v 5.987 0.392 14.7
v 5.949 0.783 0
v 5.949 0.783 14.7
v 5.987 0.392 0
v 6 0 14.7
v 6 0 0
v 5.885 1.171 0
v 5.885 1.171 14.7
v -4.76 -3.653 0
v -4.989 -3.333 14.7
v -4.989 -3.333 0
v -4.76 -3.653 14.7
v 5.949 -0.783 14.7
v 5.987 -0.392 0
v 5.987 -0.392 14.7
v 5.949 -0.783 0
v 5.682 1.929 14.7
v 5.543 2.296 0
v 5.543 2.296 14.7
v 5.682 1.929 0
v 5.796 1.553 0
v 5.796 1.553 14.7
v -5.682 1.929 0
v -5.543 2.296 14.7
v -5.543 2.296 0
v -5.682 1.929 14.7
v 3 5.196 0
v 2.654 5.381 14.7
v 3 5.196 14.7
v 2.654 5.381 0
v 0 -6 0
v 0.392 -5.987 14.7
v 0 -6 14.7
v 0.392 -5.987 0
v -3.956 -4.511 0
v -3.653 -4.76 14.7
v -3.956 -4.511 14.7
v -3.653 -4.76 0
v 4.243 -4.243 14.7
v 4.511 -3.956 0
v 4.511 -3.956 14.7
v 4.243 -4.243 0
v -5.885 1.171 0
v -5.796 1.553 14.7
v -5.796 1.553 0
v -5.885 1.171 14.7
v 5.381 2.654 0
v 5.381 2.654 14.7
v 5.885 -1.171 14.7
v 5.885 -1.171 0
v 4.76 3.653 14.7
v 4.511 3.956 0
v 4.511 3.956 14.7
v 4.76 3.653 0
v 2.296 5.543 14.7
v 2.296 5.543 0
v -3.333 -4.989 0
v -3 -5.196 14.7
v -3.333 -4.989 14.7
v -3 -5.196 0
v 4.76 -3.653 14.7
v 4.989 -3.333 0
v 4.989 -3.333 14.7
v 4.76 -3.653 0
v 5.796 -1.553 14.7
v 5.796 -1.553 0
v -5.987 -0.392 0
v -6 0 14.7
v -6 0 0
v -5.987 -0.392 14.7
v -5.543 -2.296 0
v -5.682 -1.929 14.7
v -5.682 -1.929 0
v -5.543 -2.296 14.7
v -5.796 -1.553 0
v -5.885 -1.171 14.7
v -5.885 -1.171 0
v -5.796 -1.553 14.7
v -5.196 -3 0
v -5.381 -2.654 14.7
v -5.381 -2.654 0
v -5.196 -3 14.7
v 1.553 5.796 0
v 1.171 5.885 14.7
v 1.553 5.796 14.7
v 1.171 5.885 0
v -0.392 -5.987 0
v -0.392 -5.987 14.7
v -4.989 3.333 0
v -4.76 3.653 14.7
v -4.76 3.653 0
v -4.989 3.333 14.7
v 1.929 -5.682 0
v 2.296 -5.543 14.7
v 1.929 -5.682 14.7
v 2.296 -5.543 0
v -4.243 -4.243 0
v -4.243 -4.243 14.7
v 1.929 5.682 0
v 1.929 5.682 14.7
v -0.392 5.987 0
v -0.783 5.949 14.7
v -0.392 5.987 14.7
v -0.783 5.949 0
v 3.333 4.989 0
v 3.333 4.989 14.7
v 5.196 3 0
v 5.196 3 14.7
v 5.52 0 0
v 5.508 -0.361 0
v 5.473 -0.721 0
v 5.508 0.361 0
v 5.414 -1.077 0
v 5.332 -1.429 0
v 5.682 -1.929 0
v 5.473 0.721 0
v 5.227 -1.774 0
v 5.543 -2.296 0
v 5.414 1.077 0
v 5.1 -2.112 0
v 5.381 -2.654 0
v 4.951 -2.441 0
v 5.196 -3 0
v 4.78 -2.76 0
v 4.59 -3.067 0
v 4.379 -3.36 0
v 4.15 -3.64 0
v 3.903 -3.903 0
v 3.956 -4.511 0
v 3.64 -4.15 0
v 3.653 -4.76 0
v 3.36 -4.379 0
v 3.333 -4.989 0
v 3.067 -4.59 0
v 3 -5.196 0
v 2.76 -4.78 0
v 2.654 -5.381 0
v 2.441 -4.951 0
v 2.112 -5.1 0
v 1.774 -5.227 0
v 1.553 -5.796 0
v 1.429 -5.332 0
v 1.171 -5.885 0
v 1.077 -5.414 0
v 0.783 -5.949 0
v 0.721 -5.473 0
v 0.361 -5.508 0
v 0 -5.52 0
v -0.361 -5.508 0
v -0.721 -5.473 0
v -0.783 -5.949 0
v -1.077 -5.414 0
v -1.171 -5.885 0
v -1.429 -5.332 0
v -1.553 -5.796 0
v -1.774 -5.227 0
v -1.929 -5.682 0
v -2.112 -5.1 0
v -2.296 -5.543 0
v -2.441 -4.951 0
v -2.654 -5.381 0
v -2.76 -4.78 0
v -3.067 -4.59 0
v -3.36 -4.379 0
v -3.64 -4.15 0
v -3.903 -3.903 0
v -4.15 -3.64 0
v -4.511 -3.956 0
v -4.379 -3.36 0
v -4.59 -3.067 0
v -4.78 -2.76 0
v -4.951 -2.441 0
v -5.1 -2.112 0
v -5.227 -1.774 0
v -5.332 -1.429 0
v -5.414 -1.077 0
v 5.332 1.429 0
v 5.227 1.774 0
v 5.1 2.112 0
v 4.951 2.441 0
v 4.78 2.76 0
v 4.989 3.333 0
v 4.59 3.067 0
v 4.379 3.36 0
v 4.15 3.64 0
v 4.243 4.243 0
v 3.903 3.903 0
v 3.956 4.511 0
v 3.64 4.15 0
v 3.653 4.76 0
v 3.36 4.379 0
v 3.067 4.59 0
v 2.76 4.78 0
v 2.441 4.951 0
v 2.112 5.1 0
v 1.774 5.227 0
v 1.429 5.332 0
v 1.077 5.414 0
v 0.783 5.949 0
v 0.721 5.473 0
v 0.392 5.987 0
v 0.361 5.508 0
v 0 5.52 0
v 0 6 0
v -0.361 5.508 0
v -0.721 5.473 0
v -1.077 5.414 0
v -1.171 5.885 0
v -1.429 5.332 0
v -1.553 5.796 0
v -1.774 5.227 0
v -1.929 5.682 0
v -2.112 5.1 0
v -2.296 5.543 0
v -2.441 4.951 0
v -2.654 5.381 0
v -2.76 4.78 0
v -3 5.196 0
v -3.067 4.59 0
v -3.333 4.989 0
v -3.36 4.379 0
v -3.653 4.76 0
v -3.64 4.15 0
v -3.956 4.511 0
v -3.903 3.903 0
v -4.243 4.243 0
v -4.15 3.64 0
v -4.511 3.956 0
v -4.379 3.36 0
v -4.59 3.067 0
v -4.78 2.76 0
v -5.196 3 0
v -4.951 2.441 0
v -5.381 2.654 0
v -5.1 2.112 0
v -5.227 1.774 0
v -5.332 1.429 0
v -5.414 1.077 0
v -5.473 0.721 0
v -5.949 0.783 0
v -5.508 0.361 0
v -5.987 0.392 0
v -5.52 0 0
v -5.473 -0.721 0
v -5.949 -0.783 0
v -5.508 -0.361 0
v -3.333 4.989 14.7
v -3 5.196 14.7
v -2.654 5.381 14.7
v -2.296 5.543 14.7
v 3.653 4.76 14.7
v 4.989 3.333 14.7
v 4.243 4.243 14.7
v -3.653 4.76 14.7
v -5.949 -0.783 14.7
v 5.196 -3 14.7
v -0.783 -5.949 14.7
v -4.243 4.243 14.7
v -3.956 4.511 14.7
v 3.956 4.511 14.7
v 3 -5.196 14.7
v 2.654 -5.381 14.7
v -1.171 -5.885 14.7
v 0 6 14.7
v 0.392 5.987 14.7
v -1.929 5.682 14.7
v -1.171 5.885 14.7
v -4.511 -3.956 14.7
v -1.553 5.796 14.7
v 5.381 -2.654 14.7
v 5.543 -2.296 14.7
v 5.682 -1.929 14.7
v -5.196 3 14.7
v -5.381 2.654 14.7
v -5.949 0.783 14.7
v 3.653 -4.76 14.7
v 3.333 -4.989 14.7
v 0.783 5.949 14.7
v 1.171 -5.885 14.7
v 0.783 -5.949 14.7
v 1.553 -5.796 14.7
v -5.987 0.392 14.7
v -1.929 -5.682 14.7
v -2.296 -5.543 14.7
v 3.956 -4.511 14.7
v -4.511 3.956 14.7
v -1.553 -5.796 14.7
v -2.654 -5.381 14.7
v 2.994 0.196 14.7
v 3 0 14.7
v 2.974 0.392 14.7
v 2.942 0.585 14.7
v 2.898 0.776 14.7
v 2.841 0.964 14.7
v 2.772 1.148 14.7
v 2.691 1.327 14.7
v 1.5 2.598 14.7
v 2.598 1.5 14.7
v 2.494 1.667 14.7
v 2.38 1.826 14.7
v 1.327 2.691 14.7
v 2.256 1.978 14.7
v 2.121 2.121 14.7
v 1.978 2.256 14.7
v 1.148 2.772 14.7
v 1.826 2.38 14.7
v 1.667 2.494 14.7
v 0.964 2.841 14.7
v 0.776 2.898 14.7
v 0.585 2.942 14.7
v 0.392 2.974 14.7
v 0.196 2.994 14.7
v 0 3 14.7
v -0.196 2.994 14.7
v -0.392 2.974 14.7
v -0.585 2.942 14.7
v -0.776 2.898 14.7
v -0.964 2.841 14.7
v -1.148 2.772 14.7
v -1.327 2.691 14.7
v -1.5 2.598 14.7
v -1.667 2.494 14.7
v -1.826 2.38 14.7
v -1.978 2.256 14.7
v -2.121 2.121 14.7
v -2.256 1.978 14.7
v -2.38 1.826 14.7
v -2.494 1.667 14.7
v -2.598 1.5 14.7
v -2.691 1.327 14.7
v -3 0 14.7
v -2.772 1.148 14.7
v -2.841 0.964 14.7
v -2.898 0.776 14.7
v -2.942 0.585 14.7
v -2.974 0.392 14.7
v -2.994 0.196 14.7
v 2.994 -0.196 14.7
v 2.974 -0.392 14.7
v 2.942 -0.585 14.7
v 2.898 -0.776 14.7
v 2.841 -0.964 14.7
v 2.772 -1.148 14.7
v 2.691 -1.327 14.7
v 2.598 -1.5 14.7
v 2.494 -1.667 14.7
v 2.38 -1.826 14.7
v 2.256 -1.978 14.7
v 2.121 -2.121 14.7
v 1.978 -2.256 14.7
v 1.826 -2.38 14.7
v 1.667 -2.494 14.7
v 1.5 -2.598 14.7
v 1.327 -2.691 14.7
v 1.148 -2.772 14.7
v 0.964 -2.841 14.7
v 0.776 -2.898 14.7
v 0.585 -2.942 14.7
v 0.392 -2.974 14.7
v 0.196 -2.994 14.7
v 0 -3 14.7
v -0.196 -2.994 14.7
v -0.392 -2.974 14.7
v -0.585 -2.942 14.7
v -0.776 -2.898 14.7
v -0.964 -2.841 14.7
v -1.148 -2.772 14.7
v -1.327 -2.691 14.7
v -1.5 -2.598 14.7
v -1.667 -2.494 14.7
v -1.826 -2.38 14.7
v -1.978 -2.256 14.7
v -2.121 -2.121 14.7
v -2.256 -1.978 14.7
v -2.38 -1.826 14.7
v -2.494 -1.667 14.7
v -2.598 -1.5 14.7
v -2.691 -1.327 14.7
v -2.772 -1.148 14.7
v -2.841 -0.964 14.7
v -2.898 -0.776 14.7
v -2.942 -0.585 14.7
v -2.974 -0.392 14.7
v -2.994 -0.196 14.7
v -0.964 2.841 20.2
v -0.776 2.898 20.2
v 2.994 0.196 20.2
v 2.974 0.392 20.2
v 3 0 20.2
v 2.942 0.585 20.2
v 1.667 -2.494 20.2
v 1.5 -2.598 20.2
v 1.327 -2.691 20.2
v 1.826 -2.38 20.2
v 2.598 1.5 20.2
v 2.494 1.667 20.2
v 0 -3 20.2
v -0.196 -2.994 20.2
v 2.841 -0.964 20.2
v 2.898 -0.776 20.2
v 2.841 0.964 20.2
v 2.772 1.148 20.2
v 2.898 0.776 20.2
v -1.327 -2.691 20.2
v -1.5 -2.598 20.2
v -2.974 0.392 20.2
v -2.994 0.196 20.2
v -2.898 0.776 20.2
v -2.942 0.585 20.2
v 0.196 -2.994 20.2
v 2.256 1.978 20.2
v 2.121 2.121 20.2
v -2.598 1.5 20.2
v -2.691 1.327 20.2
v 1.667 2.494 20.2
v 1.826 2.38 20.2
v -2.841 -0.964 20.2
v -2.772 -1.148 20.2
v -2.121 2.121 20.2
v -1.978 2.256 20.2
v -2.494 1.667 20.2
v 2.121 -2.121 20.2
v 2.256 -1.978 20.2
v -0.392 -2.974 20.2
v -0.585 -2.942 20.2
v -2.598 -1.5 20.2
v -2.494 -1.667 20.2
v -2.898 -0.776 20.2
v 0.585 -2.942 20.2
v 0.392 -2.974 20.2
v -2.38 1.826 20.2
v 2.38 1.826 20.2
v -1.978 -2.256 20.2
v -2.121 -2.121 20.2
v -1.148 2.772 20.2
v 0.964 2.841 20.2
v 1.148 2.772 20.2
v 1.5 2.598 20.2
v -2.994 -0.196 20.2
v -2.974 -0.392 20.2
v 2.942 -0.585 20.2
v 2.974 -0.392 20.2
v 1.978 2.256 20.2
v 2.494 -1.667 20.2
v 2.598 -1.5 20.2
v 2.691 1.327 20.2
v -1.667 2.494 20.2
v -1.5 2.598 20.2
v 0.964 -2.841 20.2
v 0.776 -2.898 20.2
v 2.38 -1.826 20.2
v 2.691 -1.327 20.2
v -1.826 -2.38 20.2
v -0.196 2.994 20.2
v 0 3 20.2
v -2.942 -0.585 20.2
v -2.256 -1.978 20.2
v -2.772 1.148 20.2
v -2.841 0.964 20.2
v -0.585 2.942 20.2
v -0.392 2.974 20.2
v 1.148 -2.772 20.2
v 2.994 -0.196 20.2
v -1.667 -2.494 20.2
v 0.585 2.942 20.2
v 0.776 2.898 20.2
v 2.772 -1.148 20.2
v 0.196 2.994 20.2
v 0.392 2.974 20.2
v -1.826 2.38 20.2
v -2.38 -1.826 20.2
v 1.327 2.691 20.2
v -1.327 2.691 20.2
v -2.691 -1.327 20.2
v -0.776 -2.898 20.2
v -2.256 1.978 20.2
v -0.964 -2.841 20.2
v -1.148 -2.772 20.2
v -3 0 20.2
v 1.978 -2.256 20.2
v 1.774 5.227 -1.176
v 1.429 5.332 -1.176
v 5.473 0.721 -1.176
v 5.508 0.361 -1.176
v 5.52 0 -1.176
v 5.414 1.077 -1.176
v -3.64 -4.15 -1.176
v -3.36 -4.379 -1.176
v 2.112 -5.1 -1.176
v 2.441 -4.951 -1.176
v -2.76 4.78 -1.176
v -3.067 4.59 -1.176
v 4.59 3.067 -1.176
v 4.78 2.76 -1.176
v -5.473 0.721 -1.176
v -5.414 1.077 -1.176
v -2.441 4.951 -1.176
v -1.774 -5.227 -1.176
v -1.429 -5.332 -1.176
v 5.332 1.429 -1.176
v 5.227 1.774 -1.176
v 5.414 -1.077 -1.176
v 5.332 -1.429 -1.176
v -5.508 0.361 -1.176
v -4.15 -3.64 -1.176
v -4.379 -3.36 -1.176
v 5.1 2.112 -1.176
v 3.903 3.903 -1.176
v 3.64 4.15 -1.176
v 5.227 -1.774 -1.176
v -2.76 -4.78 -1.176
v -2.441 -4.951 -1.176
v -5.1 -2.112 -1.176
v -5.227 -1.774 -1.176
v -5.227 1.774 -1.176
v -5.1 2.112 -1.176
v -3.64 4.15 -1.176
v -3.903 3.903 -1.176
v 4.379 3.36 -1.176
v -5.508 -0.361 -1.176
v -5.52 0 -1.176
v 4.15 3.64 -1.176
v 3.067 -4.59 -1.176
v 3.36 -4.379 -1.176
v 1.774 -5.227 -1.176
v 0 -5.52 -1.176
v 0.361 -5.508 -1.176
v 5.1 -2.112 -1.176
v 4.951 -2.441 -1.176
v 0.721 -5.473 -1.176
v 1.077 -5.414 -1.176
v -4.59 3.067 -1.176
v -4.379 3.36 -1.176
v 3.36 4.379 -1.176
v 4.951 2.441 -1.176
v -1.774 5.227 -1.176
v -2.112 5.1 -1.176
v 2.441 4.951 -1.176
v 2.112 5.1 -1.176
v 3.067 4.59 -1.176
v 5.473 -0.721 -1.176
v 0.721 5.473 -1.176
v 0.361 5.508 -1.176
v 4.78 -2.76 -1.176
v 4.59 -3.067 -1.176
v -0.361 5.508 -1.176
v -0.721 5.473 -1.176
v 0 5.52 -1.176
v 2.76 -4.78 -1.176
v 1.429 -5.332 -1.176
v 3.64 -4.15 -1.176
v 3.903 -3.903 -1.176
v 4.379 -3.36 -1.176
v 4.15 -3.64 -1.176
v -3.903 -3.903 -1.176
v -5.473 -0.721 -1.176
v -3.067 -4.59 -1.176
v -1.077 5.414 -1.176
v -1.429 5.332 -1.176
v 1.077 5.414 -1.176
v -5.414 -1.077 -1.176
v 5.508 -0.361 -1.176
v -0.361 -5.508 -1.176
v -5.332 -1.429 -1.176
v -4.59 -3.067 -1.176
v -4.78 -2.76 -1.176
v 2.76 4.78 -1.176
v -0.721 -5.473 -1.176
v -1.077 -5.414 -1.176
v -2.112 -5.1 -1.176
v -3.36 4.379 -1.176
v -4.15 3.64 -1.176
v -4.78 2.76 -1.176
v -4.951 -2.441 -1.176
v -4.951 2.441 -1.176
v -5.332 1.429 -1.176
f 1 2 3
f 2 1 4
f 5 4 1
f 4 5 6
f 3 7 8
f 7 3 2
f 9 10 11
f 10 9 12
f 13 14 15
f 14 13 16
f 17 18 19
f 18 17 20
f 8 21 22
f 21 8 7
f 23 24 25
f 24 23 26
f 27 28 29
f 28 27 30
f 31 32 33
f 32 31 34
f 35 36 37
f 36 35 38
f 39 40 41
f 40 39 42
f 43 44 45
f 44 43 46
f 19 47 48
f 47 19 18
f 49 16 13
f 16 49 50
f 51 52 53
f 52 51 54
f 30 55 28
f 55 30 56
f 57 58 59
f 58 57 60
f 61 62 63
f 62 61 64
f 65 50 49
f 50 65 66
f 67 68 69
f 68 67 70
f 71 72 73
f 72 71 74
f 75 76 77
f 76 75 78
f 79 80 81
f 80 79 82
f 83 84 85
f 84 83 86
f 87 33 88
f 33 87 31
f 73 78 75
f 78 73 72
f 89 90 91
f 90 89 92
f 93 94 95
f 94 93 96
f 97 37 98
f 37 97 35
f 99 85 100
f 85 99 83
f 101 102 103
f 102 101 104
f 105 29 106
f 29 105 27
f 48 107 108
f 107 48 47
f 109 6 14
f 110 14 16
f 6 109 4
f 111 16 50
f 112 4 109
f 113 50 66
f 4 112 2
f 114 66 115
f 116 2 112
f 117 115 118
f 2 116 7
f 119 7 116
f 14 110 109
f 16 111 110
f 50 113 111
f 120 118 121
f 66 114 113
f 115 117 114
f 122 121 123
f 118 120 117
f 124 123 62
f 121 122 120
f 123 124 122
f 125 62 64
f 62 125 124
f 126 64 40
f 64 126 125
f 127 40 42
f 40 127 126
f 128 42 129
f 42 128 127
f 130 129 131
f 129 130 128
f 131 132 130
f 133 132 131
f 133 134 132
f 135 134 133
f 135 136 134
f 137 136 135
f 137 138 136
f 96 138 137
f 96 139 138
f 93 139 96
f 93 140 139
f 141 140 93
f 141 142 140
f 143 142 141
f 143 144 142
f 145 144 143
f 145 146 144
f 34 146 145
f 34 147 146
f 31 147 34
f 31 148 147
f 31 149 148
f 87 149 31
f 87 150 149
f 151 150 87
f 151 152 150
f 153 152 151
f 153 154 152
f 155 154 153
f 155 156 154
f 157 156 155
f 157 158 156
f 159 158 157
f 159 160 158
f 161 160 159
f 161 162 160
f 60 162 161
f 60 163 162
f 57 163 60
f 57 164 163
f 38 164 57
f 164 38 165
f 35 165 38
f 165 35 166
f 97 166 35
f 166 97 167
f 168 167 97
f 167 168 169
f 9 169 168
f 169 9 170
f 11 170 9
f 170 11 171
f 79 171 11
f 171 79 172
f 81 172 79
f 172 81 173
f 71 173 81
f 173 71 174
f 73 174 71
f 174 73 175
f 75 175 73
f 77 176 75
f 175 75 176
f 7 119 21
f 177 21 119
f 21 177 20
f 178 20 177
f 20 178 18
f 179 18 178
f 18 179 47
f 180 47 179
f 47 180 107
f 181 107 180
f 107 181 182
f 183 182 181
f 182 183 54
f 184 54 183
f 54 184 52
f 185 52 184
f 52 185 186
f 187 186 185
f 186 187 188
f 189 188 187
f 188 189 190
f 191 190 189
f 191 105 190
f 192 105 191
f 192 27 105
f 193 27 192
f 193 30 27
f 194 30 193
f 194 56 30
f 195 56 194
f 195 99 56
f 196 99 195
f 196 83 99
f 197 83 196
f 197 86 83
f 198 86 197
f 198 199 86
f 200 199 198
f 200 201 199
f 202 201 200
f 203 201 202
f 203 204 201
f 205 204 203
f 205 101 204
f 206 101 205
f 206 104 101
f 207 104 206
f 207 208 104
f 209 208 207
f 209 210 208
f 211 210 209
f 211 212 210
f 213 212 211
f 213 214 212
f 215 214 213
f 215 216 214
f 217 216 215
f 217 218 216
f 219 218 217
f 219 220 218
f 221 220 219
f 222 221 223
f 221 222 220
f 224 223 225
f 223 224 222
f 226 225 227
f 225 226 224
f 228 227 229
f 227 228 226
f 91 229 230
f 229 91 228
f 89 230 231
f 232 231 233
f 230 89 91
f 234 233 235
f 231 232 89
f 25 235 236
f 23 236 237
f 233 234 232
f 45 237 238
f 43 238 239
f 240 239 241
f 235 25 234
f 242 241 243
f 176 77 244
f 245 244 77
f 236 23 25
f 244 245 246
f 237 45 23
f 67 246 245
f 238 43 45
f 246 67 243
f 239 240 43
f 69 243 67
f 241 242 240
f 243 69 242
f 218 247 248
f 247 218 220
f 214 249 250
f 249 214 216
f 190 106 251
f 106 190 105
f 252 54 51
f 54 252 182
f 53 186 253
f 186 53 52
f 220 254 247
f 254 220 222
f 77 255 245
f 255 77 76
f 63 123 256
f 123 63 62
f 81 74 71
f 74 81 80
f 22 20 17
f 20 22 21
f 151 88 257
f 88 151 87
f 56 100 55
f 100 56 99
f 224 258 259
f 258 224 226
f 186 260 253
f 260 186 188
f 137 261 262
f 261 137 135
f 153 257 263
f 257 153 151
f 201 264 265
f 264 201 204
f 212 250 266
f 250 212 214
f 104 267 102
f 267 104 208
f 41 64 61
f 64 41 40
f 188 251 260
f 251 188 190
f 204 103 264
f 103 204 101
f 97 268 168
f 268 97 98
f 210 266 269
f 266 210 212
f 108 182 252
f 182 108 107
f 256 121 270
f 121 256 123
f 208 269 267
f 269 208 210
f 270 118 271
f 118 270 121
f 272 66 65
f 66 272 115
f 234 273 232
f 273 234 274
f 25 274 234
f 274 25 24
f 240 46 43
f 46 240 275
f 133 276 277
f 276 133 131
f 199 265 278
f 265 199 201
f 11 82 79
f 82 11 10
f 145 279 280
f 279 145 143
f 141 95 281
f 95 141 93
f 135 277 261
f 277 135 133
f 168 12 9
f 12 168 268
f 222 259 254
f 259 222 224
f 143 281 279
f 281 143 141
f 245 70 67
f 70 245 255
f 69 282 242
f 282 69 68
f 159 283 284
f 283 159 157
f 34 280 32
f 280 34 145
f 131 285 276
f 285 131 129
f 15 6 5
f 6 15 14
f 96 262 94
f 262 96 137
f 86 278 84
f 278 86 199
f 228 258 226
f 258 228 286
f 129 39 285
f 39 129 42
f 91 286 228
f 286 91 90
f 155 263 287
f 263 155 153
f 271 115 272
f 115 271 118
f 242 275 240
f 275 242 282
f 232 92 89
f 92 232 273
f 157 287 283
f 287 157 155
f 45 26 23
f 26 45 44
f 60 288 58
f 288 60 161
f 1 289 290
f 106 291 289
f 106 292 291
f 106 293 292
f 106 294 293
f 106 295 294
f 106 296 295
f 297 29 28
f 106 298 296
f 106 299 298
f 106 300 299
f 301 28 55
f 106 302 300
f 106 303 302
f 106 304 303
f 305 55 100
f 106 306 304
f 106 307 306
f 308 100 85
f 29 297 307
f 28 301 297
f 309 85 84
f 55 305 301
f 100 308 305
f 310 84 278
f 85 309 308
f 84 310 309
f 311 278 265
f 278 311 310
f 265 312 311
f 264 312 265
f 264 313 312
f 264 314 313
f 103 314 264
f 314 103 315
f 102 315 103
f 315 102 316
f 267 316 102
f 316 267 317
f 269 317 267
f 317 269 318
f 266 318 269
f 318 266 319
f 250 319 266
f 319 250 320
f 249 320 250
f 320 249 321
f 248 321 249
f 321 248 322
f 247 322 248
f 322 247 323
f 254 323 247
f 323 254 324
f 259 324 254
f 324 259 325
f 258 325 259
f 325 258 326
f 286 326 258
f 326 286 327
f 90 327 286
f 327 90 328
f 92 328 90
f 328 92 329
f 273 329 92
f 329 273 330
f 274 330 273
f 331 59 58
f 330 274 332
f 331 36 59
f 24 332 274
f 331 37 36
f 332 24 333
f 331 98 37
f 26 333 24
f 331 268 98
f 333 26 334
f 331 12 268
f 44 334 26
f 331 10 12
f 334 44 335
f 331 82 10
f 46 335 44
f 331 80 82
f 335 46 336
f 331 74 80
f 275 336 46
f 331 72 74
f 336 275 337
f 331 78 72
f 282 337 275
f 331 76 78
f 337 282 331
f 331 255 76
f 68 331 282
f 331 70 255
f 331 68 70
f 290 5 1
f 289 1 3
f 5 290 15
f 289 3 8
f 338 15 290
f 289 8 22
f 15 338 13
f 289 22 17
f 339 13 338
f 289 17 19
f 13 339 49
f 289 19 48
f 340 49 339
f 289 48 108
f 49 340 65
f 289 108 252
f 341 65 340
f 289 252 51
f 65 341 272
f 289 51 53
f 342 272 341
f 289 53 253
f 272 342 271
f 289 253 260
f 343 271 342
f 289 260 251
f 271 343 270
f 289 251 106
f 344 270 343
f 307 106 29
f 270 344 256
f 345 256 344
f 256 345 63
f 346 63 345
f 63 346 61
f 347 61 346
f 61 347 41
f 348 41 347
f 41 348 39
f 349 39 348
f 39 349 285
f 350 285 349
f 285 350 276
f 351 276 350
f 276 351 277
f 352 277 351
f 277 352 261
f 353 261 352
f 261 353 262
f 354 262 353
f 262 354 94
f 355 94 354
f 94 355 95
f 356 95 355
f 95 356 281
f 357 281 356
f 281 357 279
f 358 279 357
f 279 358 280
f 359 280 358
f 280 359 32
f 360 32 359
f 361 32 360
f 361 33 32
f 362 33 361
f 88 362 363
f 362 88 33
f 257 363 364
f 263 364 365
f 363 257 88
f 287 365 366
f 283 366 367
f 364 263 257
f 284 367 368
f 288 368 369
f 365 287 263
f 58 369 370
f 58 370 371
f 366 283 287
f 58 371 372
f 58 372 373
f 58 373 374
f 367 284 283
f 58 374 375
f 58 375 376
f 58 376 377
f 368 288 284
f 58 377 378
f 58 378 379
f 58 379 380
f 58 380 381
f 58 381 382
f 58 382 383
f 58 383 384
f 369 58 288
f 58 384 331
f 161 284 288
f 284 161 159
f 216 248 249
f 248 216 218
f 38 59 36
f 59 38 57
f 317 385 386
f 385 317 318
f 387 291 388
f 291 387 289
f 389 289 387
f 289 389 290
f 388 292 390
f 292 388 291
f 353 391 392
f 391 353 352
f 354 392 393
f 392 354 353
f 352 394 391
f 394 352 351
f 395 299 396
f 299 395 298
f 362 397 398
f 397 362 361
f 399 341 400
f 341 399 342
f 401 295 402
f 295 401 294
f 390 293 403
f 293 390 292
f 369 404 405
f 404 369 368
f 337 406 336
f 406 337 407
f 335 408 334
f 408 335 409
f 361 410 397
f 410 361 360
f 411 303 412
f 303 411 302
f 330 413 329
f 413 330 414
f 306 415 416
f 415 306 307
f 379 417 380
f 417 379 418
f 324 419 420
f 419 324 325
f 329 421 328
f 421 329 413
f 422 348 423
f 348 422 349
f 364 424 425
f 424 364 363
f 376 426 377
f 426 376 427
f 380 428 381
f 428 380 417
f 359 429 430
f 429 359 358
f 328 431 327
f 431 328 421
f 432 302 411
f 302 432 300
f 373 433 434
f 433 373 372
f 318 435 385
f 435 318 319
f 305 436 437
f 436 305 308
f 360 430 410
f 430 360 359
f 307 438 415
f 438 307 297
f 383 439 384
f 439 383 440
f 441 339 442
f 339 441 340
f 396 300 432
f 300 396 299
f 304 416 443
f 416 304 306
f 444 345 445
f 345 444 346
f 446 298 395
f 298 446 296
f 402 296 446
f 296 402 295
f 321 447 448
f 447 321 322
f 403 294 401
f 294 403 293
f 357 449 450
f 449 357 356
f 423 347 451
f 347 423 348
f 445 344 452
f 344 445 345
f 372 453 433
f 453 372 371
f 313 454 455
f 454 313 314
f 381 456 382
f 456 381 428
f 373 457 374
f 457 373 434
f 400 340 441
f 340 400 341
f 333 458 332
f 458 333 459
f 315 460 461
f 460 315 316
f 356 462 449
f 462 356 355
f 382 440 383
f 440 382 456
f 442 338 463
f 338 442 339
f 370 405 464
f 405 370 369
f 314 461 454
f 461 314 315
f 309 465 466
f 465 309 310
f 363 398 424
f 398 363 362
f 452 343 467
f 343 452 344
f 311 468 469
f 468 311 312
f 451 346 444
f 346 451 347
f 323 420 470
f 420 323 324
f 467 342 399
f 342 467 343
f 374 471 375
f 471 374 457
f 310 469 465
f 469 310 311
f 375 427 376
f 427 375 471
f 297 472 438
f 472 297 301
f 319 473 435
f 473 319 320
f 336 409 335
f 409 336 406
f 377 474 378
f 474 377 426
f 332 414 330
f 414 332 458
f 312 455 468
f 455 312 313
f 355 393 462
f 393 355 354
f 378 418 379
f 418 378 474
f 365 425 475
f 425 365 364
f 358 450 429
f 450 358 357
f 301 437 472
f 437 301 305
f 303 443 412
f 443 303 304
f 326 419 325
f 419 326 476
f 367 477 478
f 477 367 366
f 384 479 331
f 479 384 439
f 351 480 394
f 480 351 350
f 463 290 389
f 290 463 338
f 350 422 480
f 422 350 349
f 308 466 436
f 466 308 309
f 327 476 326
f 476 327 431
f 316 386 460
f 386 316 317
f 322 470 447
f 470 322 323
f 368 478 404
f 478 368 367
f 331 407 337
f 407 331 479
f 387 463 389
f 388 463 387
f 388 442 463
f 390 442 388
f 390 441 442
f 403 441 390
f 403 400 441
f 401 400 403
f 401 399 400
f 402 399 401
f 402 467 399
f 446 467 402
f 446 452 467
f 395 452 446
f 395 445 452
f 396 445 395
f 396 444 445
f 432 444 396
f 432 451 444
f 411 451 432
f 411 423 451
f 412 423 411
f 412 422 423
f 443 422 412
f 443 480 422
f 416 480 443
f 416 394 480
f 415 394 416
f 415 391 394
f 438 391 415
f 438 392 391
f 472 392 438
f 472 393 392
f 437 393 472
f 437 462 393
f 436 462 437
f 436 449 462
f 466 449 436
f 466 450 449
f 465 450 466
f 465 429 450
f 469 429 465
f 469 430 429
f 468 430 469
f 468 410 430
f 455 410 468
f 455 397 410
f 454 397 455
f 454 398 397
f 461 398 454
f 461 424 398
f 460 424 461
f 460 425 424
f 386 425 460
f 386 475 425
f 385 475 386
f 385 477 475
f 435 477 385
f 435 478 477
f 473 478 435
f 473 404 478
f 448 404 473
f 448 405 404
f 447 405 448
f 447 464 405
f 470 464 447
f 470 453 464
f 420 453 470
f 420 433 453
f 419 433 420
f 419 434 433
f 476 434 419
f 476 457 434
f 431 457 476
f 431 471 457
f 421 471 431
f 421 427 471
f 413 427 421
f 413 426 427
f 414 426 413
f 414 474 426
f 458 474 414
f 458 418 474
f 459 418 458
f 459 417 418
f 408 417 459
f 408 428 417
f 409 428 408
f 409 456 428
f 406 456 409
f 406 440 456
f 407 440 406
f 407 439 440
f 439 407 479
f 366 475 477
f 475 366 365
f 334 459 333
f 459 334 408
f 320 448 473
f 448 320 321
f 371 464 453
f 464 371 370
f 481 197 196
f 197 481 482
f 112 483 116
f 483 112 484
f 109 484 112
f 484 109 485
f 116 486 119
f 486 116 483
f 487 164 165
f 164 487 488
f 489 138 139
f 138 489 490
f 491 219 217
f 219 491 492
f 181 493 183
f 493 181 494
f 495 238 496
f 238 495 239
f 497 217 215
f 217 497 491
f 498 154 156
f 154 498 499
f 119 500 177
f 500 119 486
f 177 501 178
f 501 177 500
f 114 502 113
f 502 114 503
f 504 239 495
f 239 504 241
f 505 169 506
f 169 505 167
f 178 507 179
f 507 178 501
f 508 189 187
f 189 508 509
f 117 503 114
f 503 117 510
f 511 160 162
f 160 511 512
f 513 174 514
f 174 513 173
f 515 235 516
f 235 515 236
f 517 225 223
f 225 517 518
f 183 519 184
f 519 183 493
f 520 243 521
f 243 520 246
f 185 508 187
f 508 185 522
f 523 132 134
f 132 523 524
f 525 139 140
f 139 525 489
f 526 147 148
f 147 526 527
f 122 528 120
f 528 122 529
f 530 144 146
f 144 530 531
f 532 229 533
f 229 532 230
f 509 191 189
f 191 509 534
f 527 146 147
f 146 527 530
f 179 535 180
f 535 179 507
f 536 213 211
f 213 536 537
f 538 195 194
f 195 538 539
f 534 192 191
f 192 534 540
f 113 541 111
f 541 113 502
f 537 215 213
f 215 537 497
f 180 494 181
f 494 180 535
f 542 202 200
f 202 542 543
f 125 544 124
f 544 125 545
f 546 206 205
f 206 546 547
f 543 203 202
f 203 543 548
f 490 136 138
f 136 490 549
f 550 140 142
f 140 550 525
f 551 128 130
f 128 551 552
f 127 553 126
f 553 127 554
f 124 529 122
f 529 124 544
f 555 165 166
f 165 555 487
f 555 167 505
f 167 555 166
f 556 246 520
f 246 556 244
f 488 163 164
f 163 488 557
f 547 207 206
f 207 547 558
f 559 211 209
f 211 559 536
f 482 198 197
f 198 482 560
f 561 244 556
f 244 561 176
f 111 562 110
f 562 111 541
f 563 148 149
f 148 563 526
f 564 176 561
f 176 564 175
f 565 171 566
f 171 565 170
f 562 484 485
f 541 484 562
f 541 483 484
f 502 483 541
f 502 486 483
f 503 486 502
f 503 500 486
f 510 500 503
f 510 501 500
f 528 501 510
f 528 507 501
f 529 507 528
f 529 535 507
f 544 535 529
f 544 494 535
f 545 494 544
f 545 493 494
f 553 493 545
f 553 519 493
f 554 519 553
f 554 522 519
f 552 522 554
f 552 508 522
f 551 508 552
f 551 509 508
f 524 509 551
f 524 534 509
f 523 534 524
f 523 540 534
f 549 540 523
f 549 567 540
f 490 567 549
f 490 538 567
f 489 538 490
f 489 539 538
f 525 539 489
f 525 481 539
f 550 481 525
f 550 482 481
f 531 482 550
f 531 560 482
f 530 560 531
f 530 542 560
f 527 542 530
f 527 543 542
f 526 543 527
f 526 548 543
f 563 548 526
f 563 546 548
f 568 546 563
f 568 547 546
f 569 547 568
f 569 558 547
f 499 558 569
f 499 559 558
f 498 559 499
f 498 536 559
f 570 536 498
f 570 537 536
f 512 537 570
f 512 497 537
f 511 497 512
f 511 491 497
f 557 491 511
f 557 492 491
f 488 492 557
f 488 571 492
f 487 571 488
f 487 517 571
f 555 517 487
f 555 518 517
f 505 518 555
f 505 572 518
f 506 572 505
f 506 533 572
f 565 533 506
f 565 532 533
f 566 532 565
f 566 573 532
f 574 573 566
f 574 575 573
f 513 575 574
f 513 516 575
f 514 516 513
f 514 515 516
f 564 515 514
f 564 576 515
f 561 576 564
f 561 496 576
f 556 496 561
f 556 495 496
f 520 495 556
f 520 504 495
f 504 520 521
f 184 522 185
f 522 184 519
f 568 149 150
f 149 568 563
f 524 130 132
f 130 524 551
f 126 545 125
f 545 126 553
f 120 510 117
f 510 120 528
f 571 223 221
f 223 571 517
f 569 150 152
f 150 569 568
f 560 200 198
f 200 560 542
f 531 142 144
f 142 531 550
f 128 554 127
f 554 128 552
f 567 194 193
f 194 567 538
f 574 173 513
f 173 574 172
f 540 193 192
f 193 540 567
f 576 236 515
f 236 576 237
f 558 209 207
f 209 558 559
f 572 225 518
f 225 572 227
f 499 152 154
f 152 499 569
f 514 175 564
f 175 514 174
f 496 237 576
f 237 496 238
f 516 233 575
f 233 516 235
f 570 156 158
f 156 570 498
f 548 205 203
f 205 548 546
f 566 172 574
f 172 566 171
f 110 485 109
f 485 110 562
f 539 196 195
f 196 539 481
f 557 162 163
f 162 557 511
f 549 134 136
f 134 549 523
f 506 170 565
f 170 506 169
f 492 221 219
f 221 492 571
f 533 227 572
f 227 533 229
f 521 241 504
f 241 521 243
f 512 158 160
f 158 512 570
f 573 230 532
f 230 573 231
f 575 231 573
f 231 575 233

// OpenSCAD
$fn = 96;

dims = [6, 5.5, 14.7, 12]; // [shaft_d, shaft_len, body_len, body_d]

shaft_d = dims[0];
shaft_len = dims[1];
body_len  = dims[2];
body_d    = dims[3];

module gear_motor(shaft_d, shaft_len, body_len, body_d) {
    // Main cylindrical body
    color([0.75,0.75,0.78])
    translate([0,0,0])
        cylinder(d=body_d, h=body_len);

    // Front face boss (small step)
    boss_d = body_d * 0.72;
    boss_h = max(1.2, body_len * 0.10);
    color([0.70,0.70,0.72])
    translate([0,0,body_len - boss_h])
        cylinder(d=boss_d, h=boss_h);

    // Output shaft
    color([0.85,0.85,0.88])
    translate([0,0,body_len])
        cylinder(d=shaft_d, h=shaft_len);

    // Rear cap
    cap_h = max(1.0, body_len * 0.08);
    cap_d = body_d * 0.92;
    color([0.55,0.55,0.58])
    translate([0,0,-cap_h])
        cylinder(d=cap_d, h=cap_h);

    // Simple mounting flat (a cut) to suggest gearbox housing
    difference() {
        // invisible wrapper (no-op) to apply cut to body only
        union() {}
        // cut a flat along one side of the body
        translate([body_d*0.35, -body_d, -cap_h-0.1])
            cube([body_d, body_d*2, body_len + cap_h + shaft_len + 0.2], center=false);
    }
}

gear_motor(shaft_d, shaft_len, body_len, body_d);
